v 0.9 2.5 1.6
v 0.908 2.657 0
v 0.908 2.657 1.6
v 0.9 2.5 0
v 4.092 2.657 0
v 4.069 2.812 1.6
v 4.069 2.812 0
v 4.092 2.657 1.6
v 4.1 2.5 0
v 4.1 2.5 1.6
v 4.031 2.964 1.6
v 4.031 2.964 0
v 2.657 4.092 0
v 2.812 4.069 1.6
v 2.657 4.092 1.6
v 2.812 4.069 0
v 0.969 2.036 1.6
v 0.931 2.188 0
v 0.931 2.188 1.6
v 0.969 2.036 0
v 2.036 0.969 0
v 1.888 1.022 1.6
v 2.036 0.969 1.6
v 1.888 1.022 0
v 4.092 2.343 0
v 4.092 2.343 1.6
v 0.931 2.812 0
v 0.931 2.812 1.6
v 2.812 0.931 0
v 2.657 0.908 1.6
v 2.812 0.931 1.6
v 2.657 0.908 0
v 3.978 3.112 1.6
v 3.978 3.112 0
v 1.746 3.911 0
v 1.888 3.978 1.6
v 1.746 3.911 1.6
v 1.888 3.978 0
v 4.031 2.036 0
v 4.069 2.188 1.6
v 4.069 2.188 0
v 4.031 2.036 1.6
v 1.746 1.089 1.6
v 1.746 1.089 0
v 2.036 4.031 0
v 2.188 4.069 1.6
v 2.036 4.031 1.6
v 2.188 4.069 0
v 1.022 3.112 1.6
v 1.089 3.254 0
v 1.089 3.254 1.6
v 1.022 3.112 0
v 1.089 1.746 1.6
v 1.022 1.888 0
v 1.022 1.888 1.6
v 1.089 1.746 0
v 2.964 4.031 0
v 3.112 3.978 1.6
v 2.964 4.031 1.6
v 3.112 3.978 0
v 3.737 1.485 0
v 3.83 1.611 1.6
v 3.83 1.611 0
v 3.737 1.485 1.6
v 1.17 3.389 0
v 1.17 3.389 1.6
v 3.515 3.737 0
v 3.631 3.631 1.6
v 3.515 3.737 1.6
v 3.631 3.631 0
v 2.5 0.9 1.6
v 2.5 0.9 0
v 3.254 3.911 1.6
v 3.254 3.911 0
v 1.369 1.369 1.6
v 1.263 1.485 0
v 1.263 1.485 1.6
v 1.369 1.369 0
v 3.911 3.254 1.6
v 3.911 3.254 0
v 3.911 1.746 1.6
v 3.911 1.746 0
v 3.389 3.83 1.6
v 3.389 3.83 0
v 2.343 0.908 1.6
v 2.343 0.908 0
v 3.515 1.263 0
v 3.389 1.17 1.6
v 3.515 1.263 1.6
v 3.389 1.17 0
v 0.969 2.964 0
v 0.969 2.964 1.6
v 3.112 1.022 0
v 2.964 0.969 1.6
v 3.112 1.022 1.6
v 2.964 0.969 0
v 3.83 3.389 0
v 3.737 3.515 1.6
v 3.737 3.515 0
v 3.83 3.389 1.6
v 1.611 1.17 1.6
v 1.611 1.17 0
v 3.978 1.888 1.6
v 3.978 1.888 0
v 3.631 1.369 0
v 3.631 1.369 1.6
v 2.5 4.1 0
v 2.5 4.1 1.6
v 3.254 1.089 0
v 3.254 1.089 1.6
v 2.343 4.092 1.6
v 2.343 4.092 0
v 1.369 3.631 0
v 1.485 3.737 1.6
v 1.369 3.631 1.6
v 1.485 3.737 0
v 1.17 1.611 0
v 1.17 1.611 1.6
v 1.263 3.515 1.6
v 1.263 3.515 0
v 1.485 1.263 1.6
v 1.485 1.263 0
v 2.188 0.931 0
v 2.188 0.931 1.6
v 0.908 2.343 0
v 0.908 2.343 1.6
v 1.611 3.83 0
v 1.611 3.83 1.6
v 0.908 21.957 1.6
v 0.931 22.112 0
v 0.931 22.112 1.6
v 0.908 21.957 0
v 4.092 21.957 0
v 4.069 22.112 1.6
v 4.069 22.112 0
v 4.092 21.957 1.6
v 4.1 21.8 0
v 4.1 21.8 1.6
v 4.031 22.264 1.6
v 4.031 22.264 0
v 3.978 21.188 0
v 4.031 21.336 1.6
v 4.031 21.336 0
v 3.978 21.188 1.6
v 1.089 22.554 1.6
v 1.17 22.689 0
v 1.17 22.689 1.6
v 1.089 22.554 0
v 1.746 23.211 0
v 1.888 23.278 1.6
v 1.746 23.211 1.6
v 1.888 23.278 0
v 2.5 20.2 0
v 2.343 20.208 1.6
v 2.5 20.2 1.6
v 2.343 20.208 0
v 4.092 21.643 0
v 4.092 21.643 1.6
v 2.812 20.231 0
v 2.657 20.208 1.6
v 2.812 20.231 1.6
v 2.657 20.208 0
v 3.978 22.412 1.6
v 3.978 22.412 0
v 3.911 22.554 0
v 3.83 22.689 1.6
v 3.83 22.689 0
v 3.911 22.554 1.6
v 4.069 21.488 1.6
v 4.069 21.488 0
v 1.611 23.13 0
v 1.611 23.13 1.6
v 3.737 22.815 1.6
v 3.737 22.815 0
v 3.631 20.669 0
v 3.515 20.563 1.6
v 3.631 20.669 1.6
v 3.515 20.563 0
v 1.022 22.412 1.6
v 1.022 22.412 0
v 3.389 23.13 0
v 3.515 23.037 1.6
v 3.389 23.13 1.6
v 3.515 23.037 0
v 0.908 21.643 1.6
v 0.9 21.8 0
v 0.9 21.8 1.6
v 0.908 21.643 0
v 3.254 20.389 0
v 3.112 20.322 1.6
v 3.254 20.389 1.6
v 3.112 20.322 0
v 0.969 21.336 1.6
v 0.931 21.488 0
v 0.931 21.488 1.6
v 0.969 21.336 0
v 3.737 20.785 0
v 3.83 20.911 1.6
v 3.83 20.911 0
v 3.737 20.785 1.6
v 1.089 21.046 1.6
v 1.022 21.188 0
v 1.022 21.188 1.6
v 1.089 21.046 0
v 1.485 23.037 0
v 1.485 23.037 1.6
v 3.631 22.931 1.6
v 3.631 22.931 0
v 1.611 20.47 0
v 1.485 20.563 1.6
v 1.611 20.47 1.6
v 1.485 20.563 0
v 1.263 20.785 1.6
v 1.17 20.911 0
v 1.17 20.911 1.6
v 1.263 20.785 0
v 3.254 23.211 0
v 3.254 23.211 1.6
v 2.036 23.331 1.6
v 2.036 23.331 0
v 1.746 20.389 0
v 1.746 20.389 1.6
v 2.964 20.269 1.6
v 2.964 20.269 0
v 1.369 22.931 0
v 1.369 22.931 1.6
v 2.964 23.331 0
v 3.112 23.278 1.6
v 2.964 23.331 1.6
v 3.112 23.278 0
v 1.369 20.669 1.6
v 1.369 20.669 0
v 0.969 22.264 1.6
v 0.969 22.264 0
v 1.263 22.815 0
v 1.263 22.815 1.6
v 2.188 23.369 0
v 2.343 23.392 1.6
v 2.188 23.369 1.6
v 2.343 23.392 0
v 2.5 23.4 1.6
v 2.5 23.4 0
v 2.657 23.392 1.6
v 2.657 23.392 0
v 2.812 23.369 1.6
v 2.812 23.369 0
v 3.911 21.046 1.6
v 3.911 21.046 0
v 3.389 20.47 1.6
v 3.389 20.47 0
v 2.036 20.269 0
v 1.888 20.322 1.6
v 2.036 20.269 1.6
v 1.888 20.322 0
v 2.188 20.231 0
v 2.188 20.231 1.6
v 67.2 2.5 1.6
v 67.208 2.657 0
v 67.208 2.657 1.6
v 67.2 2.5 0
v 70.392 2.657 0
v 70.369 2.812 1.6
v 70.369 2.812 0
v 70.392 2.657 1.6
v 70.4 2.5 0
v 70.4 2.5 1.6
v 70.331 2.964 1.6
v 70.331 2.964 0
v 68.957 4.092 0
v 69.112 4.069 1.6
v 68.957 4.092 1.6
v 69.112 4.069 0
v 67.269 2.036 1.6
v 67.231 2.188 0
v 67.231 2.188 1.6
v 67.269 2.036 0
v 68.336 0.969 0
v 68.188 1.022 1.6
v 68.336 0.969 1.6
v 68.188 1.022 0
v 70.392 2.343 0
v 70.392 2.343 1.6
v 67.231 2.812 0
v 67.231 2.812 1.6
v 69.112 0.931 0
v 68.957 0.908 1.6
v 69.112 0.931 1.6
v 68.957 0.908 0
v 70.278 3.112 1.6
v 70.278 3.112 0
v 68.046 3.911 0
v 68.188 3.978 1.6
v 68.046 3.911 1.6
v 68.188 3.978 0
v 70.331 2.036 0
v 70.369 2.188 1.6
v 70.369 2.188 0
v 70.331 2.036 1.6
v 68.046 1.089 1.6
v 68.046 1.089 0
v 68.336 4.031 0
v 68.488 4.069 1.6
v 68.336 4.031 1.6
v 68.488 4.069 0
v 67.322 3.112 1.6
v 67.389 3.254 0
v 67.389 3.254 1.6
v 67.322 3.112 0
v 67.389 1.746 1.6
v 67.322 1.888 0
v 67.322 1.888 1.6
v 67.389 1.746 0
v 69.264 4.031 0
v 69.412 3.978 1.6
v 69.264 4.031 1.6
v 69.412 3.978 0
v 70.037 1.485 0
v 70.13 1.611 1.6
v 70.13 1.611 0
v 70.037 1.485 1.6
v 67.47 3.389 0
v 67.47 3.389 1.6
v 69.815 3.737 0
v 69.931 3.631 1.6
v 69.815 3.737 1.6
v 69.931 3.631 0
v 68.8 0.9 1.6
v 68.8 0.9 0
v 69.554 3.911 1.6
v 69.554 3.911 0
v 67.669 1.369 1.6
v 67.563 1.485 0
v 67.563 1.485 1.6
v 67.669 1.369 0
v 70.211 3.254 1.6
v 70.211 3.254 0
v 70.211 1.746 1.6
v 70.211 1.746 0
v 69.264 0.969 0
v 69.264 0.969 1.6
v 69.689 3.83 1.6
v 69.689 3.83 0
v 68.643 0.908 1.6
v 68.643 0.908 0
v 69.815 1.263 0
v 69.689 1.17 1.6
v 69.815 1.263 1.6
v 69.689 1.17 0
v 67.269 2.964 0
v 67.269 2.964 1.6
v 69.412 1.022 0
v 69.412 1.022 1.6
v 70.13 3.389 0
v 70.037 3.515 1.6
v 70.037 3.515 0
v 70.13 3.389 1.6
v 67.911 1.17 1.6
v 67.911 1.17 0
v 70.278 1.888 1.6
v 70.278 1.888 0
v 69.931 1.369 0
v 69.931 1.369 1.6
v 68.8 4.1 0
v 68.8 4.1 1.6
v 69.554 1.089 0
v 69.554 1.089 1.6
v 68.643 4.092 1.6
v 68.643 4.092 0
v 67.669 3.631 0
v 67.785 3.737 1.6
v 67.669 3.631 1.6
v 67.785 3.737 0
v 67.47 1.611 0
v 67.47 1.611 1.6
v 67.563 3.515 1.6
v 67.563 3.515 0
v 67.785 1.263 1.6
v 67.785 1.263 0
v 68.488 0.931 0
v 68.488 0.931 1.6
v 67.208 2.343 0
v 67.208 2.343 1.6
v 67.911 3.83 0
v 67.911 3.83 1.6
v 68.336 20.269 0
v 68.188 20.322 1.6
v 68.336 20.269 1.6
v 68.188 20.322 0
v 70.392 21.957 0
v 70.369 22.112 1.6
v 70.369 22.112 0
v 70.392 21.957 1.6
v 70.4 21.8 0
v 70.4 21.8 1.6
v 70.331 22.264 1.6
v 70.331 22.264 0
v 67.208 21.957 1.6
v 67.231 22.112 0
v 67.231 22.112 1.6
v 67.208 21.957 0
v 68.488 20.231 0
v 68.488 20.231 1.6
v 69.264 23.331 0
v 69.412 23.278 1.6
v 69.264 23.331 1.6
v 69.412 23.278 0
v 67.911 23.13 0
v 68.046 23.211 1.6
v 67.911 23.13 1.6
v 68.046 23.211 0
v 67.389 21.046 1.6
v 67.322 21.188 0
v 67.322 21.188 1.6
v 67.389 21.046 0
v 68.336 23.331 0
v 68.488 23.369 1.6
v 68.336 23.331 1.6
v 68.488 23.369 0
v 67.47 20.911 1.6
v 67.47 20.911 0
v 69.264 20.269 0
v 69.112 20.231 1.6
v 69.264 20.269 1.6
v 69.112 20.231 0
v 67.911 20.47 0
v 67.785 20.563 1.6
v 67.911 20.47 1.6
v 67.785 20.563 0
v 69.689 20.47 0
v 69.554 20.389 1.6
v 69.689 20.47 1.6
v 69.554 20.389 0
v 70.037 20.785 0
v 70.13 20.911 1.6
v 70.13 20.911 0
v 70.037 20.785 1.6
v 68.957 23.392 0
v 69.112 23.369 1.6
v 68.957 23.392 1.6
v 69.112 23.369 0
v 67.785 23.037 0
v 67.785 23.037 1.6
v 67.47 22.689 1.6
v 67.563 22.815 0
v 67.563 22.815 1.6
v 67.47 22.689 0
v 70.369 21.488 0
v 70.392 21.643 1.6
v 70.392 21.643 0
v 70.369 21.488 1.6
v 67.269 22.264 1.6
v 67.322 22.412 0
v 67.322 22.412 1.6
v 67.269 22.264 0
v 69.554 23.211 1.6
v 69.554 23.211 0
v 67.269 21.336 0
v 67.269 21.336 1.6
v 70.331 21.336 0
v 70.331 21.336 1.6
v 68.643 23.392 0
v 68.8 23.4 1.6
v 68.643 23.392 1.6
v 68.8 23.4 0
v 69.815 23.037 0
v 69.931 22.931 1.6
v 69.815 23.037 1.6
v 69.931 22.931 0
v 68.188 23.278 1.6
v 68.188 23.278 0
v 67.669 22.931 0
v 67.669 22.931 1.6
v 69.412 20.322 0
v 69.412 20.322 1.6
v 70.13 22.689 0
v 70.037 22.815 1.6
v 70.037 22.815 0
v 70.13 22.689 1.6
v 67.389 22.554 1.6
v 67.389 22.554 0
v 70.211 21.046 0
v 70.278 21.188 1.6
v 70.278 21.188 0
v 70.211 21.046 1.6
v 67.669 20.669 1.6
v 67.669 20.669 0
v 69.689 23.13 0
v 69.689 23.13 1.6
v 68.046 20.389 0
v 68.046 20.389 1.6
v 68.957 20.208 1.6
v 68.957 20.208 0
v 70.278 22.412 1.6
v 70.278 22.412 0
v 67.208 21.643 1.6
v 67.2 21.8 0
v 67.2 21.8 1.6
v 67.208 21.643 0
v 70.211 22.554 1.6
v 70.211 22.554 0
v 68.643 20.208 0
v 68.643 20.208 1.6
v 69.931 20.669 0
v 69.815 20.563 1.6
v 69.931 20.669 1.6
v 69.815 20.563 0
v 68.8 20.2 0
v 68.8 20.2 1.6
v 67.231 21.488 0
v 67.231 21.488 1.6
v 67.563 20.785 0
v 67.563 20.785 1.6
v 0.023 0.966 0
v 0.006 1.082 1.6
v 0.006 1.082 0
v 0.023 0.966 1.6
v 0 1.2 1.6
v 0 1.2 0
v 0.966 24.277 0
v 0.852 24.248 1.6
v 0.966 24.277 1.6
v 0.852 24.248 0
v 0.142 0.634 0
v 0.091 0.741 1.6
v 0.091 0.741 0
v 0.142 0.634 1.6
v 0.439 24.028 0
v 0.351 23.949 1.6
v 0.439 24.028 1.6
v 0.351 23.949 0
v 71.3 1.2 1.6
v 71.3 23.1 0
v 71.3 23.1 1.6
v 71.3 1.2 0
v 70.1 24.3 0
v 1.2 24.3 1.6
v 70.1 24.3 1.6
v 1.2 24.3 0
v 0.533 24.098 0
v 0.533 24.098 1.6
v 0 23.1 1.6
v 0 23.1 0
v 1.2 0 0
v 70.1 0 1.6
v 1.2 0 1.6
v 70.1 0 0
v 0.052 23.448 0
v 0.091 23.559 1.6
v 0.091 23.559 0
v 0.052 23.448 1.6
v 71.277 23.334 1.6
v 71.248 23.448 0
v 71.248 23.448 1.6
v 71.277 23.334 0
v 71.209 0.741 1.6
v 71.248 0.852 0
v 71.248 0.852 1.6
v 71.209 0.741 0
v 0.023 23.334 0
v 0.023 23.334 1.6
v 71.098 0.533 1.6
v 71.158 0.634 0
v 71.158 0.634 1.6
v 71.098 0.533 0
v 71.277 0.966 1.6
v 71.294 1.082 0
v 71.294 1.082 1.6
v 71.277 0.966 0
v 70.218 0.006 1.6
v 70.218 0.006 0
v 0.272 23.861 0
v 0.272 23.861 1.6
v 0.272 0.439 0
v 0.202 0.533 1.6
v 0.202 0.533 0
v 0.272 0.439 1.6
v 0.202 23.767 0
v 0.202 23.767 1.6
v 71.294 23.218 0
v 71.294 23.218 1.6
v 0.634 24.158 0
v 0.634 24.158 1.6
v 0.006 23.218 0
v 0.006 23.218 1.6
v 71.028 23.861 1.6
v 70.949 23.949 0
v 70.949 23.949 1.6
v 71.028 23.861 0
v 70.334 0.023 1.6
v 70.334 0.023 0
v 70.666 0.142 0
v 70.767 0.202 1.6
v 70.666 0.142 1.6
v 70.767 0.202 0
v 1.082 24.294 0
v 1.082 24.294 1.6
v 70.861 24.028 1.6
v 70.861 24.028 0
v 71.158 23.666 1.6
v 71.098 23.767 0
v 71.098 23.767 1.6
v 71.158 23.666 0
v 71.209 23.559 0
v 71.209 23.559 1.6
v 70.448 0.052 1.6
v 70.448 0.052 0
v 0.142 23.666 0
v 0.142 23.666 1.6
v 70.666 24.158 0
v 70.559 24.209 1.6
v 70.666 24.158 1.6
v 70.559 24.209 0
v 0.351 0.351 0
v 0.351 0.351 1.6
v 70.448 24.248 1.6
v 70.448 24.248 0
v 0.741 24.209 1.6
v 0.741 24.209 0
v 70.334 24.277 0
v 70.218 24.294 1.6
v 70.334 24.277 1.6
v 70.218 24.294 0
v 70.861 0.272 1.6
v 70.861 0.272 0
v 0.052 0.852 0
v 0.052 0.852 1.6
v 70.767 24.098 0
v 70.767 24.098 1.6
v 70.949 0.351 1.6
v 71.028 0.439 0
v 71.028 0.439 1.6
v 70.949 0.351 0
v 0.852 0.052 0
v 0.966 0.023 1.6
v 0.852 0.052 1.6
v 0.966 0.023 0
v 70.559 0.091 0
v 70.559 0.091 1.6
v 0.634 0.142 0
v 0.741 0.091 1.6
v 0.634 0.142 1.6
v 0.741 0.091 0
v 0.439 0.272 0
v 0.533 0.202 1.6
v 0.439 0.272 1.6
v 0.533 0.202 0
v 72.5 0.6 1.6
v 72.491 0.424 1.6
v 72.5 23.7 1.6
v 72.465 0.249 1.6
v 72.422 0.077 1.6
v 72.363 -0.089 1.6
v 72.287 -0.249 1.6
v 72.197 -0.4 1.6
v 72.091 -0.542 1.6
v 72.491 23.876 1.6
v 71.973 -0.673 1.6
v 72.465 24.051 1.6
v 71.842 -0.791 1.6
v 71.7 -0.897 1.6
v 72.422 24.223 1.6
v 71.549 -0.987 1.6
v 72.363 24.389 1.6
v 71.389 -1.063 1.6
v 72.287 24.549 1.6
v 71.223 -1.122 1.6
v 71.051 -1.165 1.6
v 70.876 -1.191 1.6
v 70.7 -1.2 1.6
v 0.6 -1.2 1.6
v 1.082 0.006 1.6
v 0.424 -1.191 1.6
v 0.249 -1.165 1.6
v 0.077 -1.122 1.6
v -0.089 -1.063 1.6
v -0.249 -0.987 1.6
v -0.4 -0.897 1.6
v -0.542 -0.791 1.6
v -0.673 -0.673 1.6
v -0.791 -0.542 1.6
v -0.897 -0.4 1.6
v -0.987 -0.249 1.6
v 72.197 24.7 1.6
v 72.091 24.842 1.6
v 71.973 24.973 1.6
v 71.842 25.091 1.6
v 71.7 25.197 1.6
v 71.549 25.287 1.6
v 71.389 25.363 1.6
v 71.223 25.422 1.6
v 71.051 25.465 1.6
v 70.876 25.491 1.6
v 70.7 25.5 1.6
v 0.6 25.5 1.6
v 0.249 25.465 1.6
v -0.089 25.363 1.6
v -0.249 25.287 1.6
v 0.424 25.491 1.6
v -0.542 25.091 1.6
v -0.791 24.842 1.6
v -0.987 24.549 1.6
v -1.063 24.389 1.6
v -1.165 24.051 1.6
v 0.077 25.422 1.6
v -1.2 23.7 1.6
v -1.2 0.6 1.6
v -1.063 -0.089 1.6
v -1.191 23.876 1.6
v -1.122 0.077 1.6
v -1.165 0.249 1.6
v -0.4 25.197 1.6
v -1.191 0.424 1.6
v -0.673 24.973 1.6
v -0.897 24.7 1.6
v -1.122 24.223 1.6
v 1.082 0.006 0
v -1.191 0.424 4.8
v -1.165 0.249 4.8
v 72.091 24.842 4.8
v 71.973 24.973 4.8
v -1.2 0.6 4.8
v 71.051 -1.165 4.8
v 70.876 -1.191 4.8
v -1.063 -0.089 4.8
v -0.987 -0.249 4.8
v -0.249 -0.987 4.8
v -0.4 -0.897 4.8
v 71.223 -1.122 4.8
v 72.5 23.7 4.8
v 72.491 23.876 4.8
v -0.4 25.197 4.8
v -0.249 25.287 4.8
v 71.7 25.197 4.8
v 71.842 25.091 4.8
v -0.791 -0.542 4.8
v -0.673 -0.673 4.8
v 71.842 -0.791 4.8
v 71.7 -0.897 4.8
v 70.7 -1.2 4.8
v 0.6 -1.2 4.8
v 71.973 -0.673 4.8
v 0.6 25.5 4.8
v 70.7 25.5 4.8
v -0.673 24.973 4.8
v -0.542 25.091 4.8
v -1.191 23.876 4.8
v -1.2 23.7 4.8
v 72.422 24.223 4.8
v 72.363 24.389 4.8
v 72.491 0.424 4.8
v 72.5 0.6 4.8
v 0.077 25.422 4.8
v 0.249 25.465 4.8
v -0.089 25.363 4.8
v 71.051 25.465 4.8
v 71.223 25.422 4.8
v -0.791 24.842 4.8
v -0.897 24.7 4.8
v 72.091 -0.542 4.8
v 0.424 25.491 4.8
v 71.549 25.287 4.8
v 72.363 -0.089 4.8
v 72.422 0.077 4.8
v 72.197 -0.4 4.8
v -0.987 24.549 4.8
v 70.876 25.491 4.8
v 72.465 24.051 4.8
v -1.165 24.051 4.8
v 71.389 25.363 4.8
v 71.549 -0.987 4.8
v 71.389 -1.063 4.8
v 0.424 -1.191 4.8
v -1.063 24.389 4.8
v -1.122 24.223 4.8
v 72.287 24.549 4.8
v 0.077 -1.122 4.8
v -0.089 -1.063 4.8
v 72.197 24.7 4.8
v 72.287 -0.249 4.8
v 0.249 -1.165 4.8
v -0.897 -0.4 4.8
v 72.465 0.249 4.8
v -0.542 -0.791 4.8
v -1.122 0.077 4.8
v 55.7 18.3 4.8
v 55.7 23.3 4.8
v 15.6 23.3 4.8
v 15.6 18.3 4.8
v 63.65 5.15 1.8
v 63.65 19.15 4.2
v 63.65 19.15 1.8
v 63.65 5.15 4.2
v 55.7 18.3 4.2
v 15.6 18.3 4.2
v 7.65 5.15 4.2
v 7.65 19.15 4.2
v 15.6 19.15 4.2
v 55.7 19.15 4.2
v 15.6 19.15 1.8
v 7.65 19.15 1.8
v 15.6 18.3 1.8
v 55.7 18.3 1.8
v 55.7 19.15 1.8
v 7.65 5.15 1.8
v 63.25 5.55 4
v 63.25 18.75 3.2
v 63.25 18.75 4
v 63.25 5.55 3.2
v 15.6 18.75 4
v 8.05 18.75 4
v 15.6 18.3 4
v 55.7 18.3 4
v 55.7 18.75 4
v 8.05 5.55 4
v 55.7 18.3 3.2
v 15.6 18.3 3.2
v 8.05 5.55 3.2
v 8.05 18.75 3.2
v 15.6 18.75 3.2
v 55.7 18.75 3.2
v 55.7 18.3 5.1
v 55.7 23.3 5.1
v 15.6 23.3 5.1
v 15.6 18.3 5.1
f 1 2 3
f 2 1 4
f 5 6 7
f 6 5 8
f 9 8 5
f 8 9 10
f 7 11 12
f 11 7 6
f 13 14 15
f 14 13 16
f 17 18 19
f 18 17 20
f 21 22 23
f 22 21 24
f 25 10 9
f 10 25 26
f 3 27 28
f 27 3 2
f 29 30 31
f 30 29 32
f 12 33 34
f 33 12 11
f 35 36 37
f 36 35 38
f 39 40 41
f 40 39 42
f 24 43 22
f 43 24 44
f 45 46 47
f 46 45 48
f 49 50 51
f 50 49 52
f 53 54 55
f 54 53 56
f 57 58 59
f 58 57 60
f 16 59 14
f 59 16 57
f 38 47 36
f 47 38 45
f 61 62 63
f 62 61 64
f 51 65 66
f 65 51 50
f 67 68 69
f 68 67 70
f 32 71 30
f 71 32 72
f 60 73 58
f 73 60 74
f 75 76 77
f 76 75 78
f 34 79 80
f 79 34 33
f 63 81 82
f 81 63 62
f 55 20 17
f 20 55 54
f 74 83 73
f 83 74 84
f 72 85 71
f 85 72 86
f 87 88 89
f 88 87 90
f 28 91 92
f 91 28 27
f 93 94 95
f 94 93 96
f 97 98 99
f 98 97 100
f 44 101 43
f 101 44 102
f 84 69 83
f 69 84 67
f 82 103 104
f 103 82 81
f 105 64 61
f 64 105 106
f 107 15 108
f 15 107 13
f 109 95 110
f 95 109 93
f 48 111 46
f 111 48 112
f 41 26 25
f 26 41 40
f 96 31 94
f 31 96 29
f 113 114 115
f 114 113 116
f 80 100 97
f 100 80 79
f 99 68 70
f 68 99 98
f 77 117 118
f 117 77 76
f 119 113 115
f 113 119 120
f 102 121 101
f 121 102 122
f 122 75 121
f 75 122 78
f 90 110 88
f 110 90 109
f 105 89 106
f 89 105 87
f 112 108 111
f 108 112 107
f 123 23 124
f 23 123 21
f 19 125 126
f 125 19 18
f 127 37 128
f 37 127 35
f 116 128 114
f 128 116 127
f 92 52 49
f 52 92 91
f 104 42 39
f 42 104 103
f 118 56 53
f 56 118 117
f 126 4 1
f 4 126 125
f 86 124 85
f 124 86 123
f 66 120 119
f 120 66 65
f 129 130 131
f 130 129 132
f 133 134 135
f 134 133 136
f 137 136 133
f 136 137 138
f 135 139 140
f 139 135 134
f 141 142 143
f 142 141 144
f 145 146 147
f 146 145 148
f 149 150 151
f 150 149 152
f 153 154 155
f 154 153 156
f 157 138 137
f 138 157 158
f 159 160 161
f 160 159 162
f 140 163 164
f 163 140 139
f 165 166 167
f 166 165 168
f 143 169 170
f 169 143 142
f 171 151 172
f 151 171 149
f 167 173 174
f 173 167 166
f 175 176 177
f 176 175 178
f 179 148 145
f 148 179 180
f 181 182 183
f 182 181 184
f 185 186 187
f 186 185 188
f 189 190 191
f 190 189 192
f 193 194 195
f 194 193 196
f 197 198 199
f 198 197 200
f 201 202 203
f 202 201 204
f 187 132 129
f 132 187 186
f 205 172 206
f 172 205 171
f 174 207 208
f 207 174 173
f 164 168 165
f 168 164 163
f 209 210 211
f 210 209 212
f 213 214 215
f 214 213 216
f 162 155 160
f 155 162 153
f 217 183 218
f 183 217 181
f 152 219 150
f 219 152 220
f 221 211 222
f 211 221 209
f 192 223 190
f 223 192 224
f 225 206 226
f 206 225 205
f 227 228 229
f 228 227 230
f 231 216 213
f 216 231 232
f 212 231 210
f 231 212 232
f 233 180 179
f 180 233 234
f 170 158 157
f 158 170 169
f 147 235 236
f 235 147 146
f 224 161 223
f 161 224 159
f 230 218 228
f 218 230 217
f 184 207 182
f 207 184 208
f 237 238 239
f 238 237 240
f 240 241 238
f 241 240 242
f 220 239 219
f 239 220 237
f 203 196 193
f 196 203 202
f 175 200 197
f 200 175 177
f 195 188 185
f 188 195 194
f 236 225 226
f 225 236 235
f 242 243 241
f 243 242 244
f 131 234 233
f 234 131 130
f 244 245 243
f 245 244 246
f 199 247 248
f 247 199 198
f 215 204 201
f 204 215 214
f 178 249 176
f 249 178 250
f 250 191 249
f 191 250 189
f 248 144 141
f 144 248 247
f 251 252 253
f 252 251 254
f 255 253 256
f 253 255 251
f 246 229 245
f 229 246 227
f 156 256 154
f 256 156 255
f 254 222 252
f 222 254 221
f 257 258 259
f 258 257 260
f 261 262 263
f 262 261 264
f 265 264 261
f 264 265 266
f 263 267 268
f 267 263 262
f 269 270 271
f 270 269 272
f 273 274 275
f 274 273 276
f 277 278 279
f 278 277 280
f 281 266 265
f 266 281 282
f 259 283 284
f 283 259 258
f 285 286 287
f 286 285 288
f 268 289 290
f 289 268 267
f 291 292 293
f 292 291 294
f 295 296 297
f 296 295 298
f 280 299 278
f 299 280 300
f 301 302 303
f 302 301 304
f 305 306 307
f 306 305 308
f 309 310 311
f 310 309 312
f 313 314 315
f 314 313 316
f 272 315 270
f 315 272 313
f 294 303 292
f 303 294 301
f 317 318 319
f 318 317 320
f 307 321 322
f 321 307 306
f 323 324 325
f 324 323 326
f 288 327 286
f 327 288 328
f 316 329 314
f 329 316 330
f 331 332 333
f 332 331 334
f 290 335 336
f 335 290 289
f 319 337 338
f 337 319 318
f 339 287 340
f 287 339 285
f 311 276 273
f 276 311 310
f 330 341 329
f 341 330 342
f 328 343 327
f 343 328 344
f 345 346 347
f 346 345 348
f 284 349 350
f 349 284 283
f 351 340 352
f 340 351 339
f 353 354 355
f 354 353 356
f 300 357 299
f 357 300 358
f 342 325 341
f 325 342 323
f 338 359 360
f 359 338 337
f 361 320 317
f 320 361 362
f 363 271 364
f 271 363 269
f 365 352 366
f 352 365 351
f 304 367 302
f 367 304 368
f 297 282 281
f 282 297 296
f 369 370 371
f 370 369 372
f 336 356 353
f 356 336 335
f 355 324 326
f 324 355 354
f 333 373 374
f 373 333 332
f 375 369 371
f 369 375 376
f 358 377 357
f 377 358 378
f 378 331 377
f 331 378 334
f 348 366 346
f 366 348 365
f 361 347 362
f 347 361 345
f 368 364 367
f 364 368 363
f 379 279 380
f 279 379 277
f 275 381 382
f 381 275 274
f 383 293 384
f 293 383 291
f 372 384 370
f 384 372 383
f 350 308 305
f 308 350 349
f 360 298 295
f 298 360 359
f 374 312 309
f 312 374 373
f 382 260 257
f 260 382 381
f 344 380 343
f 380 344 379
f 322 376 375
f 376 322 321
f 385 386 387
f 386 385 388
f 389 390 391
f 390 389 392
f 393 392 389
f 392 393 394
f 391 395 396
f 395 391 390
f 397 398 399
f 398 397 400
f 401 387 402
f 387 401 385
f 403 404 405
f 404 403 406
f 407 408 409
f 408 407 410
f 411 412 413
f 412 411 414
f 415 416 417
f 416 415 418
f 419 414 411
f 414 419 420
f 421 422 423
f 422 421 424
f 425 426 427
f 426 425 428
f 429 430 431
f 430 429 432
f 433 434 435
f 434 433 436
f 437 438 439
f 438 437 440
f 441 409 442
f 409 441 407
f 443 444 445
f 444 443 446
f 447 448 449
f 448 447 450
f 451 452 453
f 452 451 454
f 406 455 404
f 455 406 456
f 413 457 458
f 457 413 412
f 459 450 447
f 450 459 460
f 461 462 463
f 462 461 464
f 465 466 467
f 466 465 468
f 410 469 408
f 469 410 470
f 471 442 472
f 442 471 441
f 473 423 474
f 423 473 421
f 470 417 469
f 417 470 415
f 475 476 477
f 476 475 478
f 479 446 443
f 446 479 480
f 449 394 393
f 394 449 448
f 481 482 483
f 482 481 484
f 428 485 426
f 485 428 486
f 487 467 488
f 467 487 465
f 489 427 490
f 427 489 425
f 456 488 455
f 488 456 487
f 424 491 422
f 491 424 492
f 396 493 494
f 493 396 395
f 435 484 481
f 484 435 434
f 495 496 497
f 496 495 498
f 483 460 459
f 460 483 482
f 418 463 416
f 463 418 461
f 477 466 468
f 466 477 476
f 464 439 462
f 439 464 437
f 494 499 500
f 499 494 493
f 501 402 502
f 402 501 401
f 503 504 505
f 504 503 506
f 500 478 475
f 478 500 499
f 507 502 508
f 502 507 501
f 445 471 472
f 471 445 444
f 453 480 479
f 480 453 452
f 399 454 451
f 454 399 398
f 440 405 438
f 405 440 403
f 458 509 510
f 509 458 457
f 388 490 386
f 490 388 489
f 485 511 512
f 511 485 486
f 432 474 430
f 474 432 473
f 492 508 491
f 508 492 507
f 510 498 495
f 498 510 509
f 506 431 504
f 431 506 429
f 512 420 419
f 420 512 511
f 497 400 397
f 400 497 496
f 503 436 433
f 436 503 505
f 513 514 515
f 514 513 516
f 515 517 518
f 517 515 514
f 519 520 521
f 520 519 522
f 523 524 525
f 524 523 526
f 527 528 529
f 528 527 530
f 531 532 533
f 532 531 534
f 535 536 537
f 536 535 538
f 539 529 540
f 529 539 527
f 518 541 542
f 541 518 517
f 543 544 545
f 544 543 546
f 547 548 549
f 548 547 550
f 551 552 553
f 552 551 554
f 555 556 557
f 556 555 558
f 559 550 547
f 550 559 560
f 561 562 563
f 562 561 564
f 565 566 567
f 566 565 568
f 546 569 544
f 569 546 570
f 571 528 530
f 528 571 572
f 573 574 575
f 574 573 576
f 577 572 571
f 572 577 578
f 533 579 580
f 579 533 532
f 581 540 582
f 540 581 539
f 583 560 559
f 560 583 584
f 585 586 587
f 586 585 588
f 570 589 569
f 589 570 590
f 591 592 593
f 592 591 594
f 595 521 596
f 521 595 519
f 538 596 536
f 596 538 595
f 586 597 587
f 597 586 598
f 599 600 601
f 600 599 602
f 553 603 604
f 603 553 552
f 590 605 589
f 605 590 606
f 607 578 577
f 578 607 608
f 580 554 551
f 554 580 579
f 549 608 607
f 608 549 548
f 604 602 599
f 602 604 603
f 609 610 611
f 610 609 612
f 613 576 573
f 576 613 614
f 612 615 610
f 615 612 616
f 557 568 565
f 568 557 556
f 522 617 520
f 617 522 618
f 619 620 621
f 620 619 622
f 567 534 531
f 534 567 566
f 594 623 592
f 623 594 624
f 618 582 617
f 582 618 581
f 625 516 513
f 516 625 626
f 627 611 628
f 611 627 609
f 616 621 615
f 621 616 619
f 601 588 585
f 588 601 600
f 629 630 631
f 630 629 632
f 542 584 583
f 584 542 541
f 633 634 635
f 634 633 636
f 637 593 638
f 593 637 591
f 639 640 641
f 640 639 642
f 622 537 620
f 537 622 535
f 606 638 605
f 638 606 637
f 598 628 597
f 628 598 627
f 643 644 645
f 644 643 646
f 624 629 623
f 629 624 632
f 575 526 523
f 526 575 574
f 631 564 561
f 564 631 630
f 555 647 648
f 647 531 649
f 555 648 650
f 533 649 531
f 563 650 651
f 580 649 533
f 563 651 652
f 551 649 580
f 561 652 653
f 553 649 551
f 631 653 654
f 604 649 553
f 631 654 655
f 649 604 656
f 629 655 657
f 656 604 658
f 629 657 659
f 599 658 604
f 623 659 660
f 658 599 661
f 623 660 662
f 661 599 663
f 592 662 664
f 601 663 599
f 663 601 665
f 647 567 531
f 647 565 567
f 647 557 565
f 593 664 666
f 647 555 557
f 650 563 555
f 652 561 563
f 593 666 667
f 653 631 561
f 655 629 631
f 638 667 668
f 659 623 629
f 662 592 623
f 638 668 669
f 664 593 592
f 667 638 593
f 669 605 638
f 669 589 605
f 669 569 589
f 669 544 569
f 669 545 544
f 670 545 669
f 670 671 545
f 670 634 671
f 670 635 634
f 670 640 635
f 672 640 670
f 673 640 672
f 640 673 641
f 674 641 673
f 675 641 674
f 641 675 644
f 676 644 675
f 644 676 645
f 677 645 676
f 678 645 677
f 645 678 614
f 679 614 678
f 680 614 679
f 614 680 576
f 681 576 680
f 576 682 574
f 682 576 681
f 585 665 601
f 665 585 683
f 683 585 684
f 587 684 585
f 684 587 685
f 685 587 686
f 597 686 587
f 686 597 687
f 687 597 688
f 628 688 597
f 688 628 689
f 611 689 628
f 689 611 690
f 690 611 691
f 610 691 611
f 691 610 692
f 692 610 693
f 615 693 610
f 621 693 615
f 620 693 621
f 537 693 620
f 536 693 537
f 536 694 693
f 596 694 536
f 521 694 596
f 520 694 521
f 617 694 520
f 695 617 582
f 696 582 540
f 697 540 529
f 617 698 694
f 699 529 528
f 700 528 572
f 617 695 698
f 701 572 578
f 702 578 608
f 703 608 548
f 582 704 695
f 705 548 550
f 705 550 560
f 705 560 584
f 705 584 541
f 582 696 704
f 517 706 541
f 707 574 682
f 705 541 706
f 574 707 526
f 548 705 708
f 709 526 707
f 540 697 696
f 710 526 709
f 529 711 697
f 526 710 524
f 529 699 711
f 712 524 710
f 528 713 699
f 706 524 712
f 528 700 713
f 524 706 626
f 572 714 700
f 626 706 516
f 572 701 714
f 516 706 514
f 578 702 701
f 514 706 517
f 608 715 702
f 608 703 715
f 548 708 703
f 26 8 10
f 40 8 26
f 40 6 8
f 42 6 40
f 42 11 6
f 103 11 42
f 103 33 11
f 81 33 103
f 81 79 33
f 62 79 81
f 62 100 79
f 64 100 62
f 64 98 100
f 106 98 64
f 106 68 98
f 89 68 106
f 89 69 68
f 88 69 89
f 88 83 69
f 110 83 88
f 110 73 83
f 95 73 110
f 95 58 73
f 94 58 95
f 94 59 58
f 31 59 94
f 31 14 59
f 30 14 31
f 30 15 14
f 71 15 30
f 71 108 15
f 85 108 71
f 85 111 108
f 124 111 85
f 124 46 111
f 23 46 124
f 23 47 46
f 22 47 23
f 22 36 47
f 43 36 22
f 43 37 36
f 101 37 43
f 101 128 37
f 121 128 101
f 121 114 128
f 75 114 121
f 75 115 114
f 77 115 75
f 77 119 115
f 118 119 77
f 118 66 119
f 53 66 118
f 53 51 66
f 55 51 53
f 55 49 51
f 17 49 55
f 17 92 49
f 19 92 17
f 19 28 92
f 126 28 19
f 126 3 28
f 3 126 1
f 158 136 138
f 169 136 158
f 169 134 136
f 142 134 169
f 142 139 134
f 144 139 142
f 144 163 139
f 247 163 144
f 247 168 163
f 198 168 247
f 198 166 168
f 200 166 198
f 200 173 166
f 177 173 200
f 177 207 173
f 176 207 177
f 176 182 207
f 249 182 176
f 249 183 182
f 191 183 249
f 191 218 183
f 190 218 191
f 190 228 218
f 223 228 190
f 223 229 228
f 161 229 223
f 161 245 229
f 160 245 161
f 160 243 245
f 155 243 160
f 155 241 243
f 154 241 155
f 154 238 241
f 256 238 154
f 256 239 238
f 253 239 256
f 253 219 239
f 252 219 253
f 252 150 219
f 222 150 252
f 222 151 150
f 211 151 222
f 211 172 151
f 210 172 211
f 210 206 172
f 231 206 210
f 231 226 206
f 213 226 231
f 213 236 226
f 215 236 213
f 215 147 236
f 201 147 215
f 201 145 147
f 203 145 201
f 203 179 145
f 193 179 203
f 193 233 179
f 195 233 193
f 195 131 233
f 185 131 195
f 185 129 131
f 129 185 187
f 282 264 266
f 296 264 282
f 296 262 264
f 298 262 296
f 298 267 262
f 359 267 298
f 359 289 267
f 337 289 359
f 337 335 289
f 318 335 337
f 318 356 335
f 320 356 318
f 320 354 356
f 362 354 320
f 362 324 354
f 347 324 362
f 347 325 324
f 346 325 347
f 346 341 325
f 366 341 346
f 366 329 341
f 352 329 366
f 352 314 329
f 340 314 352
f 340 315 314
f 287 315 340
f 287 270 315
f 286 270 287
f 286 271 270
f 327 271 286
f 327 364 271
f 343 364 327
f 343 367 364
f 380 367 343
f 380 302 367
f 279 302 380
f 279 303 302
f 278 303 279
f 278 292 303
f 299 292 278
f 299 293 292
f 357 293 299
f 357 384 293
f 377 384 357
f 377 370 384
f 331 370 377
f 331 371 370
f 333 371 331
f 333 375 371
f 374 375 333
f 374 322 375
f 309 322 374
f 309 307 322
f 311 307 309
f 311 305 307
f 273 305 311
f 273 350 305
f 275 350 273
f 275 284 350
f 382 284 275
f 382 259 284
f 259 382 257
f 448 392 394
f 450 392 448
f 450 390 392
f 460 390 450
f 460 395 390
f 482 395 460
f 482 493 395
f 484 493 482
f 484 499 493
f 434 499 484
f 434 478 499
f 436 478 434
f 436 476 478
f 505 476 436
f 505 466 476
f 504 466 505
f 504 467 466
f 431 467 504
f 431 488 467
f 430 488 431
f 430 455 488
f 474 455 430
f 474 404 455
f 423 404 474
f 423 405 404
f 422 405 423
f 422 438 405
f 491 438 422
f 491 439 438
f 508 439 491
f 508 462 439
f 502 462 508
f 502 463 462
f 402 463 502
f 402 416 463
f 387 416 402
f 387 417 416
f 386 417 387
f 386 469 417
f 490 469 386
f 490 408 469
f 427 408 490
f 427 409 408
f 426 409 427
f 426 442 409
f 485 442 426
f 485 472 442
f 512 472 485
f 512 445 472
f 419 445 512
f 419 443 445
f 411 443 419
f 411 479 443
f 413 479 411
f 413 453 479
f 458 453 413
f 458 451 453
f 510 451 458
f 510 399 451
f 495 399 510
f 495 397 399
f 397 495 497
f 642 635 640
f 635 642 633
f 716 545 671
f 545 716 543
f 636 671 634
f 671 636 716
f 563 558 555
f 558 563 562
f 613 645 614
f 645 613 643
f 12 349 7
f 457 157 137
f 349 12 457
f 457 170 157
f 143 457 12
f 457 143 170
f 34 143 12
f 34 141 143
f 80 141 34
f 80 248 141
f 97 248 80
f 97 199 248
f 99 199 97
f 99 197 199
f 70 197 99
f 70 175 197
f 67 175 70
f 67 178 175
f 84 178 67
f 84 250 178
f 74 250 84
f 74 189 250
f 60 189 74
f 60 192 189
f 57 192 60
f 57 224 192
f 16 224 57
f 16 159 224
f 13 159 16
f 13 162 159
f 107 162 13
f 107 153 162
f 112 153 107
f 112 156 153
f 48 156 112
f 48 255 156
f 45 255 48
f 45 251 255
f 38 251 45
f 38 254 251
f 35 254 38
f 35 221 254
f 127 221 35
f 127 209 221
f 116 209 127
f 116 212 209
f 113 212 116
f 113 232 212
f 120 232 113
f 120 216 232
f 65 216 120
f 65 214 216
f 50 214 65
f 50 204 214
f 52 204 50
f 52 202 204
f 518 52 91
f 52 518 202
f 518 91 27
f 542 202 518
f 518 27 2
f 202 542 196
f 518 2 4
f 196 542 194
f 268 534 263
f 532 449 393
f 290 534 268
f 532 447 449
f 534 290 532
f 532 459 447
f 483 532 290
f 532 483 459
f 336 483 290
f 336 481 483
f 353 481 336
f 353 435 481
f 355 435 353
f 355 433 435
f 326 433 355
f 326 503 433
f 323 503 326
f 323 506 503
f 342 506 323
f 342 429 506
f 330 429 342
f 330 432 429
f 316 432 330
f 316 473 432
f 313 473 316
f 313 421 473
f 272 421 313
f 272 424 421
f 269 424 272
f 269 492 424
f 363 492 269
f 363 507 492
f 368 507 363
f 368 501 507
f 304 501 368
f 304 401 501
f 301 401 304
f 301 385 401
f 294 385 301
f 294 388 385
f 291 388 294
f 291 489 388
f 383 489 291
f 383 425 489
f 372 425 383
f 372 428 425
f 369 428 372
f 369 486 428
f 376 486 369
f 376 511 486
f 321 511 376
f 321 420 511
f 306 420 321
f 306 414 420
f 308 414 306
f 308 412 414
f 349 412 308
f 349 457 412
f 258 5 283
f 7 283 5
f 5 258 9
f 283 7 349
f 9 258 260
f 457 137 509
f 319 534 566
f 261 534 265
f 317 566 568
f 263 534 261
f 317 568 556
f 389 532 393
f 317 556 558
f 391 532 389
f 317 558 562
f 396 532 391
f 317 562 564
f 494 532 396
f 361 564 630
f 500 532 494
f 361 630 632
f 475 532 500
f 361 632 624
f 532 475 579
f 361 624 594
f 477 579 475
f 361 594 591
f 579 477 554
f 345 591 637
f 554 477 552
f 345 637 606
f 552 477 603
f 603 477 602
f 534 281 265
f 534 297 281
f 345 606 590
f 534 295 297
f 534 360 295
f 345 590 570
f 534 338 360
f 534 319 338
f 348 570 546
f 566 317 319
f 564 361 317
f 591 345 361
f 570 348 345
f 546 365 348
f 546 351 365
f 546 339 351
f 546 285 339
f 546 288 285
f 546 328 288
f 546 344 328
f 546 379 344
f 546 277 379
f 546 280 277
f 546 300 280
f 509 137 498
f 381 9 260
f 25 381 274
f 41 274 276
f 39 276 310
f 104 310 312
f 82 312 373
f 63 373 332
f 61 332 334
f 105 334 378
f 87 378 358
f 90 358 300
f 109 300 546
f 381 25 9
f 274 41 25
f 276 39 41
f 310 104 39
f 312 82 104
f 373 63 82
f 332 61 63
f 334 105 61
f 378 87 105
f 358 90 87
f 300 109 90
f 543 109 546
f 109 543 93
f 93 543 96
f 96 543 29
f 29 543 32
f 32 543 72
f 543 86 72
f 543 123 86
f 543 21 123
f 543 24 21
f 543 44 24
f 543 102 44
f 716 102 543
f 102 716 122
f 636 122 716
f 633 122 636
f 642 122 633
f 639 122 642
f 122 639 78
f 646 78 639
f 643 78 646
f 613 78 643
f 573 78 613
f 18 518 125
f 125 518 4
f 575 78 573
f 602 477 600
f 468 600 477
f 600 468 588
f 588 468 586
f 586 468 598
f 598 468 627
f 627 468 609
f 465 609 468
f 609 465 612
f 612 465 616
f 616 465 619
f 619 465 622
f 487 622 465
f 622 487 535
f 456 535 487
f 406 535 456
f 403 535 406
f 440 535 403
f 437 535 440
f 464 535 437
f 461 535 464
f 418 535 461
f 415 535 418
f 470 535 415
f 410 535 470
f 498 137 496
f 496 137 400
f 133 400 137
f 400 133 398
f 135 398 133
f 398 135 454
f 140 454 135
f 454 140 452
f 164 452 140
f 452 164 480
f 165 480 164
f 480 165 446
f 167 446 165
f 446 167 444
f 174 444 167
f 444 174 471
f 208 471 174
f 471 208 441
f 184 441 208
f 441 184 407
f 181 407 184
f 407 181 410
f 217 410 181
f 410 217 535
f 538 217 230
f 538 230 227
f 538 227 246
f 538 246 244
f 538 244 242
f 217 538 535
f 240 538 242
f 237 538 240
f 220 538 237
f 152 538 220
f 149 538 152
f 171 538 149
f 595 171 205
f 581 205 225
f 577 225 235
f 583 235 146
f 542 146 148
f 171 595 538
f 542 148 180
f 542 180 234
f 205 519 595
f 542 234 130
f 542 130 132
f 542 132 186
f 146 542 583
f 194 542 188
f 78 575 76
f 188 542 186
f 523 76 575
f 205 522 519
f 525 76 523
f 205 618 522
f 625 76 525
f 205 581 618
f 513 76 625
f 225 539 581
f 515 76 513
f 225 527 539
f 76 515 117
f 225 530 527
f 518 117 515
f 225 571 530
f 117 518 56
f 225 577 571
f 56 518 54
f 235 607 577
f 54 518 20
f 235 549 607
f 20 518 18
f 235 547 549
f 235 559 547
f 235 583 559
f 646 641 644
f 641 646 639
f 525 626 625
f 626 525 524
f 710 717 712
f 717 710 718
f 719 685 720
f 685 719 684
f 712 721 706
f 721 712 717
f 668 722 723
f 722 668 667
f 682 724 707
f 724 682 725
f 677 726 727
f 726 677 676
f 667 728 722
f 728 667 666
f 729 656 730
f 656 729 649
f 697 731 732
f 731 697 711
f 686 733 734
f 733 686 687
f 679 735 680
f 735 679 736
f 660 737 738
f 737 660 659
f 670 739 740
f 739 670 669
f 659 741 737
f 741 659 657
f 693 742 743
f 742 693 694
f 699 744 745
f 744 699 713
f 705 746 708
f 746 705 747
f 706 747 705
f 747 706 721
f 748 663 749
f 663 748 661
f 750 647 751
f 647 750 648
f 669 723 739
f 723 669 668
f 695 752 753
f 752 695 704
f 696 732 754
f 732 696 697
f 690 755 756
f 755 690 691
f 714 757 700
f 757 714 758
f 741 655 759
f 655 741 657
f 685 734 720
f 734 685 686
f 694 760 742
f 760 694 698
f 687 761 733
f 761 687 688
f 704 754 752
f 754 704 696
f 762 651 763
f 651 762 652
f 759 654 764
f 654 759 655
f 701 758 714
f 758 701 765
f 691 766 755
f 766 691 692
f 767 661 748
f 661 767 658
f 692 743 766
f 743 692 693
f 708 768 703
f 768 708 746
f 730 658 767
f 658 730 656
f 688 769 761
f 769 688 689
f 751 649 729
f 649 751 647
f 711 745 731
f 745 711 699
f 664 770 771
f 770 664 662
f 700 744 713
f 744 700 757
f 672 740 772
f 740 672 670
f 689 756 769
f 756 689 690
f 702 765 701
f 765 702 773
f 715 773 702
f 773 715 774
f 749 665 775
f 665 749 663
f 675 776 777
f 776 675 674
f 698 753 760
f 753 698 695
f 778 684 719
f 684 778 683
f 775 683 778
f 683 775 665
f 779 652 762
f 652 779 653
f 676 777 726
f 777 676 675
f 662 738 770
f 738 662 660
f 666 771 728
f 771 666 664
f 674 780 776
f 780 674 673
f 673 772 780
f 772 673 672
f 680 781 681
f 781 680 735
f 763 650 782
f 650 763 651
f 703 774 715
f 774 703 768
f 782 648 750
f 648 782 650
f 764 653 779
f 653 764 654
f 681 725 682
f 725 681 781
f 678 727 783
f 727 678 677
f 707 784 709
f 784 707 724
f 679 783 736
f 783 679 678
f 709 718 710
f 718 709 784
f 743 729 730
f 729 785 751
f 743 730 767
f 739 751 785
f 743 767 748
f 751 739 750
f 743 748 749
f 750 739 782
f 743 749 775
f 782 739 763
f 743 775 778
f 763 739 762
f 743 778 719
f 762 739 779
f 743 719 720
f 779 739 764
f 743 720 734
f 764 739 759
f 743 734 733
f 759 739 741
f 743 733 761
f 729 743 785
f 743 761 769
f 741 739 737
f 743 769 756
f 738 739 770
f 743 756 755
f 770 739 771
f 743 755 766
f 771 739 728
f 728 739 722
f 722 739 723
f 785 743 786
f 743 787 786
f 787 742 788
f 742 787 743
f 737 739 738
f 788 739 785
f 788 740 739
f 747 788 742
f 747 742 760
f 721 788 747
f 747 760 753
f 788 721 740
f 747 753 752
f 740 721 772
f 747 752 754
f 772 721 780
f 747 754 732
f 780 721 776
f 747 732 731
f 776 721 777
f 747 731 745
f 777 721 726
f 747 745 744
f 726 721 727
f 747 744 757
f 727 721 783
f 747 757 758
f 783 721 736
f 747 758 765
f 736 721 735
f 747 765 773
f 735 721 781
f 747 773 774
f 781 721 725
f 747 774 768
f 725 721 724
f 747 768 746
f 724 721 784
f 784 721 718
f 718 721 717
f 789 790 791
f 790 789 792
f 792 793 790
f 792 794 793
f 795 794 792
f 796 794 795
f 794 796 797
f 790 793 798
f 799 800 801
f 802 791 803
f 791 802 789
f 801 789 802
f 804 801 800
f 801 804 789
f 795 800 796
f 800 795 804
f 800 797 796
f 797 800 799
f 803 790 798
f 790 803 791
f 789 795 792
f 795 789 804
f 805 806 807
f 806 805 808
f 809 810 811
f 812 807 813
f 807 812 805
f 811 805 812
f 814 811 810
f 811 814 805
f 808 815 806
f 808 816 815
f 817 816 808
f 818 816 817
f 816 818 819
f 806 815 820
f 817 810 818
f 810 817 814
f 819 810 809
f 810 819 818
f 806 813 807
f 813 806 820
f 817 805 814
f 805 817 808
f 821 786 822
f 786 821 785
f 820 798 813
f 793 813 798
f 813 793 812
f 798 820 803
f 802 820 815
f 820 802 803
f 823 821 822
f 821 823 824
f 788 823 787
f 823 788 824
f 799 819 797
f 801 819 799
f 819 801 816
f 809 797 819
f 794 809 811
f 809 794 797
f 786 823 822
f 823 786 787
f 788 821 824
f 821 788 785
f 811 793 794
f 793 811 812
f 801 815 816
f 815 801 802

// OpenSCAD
$fn = 64;

// LCD 1602A display module (approx) overall size: 71.3mm x 24.3mm
// Simple solid model with PCB, bezel, and display window.

module lcd1602a_module(
    pcb_x = 71.3,
    pcb_y = 24.3,
    pcb_z = 1.6,

    bezel_margin = 1.2,     // bezel overhang beyond PCB on each side
    bezel_z = 3.2,          // bezel height above PCB top

    window_x = 56.0,        // visible window opening (approx)
    window_y = 14.0,
    window_inset = 0.8,     // inset from bezel top
    window_depth = 2.2,     // cut depth into bezel

    corner_r = 1.2,

    hole_d = 3.2,           // mounting holes (approx M3 clearance)
    hole_edge_x = 2.5,      // distance from PCB edge to hole center (approx)
    hole_edge_y = 2.5
) {
    pcb_color = [0.05, 0.35, 0.12];
    bezel_color = [0.10, 0.10, 0.10];
    glass_color = [0.05, 0.20, 0.25, 0.65];

    module rounded_rect_2d(x, y, r) {
        r2 = min(r, min(x, y)/2);
        hull() {
            translate([ r2,  r2]) circle(r=r2);
            translate([x-r2,  r2]) circle(r=r2);
            translate([ r2, y-r2]) circle(r=r2);
            translate([x-r2, y-r2]) circle(r=r2);
        }
    }

    module pcb_body() {
        difference() {
            color(pcb_color)
                linear_extrude(height=pcb_z)
                    rounded_rect_2d(pcb_x, pcb_y, corner_r);

            // mounting holes (4 corners)
            for (sx = [hole_edge_x, pcb_x - hole_edge_x])
            for (sy = [hole_edge_y, pcb_y - hole_edge_y])
                translate([sx, sy, -0.1])
                    cylinder(d=hole_d, h=pcb_z + 0.2);
        }
    }

    module bezel_body() {
        bx = pcb_x + 2*bezel_margin;
        by = pcb_y + 2*bezel_margin;

        difference() {
            color(bezel_color)
                translate([-bezel_margin, -bezel_margin, pcb_z])
                    linear_extrude(height=bezel_z)
                        rounded_rect_2d(bx, by, corner_r + 0.6);

            // window cut
            translate([ (pcb_x - window_x)/2, (pcb_y - window_y)/2, pcb_z + bezel_z - window_inset - window_depth ])
                cube([window_x, window_y, window_depth + 0.2], center=false);
        }

        // glass insert (slightly recessed)
        color(glass_color)
            translate([ (pcb_x - window_x)/2 + 0.4, (pcb_y - window_y)/2 + 0.4, pcb_z + bezel_z - window_inset - 0.8 ])
                cube([window_x - 0.8, window_y - 0.8, 0.8], center=false);
    }

    // Optional: simple 16-pin header block on top edge (approx)
    module header_block() {
        pin_count = 16;
        pitch = 2.54;
        hdr_x = (pin_count-1)*pitch + 2.0;
        hdr_y = 5.0;
        hdr_z = 3.5;

        // place near top edge, centered
        translate([ (pcb_x - hdr_x)/2, pcb_y - hdr_y - 1.0, pcb_z ])
            color([0.15,0.15,0.15])
                cube([hdr_x, hdr_y, hdr_z], center=false);
    }

    pcb_body();
    bezel_body();
    header_block();
}

lcd1602a_module();
